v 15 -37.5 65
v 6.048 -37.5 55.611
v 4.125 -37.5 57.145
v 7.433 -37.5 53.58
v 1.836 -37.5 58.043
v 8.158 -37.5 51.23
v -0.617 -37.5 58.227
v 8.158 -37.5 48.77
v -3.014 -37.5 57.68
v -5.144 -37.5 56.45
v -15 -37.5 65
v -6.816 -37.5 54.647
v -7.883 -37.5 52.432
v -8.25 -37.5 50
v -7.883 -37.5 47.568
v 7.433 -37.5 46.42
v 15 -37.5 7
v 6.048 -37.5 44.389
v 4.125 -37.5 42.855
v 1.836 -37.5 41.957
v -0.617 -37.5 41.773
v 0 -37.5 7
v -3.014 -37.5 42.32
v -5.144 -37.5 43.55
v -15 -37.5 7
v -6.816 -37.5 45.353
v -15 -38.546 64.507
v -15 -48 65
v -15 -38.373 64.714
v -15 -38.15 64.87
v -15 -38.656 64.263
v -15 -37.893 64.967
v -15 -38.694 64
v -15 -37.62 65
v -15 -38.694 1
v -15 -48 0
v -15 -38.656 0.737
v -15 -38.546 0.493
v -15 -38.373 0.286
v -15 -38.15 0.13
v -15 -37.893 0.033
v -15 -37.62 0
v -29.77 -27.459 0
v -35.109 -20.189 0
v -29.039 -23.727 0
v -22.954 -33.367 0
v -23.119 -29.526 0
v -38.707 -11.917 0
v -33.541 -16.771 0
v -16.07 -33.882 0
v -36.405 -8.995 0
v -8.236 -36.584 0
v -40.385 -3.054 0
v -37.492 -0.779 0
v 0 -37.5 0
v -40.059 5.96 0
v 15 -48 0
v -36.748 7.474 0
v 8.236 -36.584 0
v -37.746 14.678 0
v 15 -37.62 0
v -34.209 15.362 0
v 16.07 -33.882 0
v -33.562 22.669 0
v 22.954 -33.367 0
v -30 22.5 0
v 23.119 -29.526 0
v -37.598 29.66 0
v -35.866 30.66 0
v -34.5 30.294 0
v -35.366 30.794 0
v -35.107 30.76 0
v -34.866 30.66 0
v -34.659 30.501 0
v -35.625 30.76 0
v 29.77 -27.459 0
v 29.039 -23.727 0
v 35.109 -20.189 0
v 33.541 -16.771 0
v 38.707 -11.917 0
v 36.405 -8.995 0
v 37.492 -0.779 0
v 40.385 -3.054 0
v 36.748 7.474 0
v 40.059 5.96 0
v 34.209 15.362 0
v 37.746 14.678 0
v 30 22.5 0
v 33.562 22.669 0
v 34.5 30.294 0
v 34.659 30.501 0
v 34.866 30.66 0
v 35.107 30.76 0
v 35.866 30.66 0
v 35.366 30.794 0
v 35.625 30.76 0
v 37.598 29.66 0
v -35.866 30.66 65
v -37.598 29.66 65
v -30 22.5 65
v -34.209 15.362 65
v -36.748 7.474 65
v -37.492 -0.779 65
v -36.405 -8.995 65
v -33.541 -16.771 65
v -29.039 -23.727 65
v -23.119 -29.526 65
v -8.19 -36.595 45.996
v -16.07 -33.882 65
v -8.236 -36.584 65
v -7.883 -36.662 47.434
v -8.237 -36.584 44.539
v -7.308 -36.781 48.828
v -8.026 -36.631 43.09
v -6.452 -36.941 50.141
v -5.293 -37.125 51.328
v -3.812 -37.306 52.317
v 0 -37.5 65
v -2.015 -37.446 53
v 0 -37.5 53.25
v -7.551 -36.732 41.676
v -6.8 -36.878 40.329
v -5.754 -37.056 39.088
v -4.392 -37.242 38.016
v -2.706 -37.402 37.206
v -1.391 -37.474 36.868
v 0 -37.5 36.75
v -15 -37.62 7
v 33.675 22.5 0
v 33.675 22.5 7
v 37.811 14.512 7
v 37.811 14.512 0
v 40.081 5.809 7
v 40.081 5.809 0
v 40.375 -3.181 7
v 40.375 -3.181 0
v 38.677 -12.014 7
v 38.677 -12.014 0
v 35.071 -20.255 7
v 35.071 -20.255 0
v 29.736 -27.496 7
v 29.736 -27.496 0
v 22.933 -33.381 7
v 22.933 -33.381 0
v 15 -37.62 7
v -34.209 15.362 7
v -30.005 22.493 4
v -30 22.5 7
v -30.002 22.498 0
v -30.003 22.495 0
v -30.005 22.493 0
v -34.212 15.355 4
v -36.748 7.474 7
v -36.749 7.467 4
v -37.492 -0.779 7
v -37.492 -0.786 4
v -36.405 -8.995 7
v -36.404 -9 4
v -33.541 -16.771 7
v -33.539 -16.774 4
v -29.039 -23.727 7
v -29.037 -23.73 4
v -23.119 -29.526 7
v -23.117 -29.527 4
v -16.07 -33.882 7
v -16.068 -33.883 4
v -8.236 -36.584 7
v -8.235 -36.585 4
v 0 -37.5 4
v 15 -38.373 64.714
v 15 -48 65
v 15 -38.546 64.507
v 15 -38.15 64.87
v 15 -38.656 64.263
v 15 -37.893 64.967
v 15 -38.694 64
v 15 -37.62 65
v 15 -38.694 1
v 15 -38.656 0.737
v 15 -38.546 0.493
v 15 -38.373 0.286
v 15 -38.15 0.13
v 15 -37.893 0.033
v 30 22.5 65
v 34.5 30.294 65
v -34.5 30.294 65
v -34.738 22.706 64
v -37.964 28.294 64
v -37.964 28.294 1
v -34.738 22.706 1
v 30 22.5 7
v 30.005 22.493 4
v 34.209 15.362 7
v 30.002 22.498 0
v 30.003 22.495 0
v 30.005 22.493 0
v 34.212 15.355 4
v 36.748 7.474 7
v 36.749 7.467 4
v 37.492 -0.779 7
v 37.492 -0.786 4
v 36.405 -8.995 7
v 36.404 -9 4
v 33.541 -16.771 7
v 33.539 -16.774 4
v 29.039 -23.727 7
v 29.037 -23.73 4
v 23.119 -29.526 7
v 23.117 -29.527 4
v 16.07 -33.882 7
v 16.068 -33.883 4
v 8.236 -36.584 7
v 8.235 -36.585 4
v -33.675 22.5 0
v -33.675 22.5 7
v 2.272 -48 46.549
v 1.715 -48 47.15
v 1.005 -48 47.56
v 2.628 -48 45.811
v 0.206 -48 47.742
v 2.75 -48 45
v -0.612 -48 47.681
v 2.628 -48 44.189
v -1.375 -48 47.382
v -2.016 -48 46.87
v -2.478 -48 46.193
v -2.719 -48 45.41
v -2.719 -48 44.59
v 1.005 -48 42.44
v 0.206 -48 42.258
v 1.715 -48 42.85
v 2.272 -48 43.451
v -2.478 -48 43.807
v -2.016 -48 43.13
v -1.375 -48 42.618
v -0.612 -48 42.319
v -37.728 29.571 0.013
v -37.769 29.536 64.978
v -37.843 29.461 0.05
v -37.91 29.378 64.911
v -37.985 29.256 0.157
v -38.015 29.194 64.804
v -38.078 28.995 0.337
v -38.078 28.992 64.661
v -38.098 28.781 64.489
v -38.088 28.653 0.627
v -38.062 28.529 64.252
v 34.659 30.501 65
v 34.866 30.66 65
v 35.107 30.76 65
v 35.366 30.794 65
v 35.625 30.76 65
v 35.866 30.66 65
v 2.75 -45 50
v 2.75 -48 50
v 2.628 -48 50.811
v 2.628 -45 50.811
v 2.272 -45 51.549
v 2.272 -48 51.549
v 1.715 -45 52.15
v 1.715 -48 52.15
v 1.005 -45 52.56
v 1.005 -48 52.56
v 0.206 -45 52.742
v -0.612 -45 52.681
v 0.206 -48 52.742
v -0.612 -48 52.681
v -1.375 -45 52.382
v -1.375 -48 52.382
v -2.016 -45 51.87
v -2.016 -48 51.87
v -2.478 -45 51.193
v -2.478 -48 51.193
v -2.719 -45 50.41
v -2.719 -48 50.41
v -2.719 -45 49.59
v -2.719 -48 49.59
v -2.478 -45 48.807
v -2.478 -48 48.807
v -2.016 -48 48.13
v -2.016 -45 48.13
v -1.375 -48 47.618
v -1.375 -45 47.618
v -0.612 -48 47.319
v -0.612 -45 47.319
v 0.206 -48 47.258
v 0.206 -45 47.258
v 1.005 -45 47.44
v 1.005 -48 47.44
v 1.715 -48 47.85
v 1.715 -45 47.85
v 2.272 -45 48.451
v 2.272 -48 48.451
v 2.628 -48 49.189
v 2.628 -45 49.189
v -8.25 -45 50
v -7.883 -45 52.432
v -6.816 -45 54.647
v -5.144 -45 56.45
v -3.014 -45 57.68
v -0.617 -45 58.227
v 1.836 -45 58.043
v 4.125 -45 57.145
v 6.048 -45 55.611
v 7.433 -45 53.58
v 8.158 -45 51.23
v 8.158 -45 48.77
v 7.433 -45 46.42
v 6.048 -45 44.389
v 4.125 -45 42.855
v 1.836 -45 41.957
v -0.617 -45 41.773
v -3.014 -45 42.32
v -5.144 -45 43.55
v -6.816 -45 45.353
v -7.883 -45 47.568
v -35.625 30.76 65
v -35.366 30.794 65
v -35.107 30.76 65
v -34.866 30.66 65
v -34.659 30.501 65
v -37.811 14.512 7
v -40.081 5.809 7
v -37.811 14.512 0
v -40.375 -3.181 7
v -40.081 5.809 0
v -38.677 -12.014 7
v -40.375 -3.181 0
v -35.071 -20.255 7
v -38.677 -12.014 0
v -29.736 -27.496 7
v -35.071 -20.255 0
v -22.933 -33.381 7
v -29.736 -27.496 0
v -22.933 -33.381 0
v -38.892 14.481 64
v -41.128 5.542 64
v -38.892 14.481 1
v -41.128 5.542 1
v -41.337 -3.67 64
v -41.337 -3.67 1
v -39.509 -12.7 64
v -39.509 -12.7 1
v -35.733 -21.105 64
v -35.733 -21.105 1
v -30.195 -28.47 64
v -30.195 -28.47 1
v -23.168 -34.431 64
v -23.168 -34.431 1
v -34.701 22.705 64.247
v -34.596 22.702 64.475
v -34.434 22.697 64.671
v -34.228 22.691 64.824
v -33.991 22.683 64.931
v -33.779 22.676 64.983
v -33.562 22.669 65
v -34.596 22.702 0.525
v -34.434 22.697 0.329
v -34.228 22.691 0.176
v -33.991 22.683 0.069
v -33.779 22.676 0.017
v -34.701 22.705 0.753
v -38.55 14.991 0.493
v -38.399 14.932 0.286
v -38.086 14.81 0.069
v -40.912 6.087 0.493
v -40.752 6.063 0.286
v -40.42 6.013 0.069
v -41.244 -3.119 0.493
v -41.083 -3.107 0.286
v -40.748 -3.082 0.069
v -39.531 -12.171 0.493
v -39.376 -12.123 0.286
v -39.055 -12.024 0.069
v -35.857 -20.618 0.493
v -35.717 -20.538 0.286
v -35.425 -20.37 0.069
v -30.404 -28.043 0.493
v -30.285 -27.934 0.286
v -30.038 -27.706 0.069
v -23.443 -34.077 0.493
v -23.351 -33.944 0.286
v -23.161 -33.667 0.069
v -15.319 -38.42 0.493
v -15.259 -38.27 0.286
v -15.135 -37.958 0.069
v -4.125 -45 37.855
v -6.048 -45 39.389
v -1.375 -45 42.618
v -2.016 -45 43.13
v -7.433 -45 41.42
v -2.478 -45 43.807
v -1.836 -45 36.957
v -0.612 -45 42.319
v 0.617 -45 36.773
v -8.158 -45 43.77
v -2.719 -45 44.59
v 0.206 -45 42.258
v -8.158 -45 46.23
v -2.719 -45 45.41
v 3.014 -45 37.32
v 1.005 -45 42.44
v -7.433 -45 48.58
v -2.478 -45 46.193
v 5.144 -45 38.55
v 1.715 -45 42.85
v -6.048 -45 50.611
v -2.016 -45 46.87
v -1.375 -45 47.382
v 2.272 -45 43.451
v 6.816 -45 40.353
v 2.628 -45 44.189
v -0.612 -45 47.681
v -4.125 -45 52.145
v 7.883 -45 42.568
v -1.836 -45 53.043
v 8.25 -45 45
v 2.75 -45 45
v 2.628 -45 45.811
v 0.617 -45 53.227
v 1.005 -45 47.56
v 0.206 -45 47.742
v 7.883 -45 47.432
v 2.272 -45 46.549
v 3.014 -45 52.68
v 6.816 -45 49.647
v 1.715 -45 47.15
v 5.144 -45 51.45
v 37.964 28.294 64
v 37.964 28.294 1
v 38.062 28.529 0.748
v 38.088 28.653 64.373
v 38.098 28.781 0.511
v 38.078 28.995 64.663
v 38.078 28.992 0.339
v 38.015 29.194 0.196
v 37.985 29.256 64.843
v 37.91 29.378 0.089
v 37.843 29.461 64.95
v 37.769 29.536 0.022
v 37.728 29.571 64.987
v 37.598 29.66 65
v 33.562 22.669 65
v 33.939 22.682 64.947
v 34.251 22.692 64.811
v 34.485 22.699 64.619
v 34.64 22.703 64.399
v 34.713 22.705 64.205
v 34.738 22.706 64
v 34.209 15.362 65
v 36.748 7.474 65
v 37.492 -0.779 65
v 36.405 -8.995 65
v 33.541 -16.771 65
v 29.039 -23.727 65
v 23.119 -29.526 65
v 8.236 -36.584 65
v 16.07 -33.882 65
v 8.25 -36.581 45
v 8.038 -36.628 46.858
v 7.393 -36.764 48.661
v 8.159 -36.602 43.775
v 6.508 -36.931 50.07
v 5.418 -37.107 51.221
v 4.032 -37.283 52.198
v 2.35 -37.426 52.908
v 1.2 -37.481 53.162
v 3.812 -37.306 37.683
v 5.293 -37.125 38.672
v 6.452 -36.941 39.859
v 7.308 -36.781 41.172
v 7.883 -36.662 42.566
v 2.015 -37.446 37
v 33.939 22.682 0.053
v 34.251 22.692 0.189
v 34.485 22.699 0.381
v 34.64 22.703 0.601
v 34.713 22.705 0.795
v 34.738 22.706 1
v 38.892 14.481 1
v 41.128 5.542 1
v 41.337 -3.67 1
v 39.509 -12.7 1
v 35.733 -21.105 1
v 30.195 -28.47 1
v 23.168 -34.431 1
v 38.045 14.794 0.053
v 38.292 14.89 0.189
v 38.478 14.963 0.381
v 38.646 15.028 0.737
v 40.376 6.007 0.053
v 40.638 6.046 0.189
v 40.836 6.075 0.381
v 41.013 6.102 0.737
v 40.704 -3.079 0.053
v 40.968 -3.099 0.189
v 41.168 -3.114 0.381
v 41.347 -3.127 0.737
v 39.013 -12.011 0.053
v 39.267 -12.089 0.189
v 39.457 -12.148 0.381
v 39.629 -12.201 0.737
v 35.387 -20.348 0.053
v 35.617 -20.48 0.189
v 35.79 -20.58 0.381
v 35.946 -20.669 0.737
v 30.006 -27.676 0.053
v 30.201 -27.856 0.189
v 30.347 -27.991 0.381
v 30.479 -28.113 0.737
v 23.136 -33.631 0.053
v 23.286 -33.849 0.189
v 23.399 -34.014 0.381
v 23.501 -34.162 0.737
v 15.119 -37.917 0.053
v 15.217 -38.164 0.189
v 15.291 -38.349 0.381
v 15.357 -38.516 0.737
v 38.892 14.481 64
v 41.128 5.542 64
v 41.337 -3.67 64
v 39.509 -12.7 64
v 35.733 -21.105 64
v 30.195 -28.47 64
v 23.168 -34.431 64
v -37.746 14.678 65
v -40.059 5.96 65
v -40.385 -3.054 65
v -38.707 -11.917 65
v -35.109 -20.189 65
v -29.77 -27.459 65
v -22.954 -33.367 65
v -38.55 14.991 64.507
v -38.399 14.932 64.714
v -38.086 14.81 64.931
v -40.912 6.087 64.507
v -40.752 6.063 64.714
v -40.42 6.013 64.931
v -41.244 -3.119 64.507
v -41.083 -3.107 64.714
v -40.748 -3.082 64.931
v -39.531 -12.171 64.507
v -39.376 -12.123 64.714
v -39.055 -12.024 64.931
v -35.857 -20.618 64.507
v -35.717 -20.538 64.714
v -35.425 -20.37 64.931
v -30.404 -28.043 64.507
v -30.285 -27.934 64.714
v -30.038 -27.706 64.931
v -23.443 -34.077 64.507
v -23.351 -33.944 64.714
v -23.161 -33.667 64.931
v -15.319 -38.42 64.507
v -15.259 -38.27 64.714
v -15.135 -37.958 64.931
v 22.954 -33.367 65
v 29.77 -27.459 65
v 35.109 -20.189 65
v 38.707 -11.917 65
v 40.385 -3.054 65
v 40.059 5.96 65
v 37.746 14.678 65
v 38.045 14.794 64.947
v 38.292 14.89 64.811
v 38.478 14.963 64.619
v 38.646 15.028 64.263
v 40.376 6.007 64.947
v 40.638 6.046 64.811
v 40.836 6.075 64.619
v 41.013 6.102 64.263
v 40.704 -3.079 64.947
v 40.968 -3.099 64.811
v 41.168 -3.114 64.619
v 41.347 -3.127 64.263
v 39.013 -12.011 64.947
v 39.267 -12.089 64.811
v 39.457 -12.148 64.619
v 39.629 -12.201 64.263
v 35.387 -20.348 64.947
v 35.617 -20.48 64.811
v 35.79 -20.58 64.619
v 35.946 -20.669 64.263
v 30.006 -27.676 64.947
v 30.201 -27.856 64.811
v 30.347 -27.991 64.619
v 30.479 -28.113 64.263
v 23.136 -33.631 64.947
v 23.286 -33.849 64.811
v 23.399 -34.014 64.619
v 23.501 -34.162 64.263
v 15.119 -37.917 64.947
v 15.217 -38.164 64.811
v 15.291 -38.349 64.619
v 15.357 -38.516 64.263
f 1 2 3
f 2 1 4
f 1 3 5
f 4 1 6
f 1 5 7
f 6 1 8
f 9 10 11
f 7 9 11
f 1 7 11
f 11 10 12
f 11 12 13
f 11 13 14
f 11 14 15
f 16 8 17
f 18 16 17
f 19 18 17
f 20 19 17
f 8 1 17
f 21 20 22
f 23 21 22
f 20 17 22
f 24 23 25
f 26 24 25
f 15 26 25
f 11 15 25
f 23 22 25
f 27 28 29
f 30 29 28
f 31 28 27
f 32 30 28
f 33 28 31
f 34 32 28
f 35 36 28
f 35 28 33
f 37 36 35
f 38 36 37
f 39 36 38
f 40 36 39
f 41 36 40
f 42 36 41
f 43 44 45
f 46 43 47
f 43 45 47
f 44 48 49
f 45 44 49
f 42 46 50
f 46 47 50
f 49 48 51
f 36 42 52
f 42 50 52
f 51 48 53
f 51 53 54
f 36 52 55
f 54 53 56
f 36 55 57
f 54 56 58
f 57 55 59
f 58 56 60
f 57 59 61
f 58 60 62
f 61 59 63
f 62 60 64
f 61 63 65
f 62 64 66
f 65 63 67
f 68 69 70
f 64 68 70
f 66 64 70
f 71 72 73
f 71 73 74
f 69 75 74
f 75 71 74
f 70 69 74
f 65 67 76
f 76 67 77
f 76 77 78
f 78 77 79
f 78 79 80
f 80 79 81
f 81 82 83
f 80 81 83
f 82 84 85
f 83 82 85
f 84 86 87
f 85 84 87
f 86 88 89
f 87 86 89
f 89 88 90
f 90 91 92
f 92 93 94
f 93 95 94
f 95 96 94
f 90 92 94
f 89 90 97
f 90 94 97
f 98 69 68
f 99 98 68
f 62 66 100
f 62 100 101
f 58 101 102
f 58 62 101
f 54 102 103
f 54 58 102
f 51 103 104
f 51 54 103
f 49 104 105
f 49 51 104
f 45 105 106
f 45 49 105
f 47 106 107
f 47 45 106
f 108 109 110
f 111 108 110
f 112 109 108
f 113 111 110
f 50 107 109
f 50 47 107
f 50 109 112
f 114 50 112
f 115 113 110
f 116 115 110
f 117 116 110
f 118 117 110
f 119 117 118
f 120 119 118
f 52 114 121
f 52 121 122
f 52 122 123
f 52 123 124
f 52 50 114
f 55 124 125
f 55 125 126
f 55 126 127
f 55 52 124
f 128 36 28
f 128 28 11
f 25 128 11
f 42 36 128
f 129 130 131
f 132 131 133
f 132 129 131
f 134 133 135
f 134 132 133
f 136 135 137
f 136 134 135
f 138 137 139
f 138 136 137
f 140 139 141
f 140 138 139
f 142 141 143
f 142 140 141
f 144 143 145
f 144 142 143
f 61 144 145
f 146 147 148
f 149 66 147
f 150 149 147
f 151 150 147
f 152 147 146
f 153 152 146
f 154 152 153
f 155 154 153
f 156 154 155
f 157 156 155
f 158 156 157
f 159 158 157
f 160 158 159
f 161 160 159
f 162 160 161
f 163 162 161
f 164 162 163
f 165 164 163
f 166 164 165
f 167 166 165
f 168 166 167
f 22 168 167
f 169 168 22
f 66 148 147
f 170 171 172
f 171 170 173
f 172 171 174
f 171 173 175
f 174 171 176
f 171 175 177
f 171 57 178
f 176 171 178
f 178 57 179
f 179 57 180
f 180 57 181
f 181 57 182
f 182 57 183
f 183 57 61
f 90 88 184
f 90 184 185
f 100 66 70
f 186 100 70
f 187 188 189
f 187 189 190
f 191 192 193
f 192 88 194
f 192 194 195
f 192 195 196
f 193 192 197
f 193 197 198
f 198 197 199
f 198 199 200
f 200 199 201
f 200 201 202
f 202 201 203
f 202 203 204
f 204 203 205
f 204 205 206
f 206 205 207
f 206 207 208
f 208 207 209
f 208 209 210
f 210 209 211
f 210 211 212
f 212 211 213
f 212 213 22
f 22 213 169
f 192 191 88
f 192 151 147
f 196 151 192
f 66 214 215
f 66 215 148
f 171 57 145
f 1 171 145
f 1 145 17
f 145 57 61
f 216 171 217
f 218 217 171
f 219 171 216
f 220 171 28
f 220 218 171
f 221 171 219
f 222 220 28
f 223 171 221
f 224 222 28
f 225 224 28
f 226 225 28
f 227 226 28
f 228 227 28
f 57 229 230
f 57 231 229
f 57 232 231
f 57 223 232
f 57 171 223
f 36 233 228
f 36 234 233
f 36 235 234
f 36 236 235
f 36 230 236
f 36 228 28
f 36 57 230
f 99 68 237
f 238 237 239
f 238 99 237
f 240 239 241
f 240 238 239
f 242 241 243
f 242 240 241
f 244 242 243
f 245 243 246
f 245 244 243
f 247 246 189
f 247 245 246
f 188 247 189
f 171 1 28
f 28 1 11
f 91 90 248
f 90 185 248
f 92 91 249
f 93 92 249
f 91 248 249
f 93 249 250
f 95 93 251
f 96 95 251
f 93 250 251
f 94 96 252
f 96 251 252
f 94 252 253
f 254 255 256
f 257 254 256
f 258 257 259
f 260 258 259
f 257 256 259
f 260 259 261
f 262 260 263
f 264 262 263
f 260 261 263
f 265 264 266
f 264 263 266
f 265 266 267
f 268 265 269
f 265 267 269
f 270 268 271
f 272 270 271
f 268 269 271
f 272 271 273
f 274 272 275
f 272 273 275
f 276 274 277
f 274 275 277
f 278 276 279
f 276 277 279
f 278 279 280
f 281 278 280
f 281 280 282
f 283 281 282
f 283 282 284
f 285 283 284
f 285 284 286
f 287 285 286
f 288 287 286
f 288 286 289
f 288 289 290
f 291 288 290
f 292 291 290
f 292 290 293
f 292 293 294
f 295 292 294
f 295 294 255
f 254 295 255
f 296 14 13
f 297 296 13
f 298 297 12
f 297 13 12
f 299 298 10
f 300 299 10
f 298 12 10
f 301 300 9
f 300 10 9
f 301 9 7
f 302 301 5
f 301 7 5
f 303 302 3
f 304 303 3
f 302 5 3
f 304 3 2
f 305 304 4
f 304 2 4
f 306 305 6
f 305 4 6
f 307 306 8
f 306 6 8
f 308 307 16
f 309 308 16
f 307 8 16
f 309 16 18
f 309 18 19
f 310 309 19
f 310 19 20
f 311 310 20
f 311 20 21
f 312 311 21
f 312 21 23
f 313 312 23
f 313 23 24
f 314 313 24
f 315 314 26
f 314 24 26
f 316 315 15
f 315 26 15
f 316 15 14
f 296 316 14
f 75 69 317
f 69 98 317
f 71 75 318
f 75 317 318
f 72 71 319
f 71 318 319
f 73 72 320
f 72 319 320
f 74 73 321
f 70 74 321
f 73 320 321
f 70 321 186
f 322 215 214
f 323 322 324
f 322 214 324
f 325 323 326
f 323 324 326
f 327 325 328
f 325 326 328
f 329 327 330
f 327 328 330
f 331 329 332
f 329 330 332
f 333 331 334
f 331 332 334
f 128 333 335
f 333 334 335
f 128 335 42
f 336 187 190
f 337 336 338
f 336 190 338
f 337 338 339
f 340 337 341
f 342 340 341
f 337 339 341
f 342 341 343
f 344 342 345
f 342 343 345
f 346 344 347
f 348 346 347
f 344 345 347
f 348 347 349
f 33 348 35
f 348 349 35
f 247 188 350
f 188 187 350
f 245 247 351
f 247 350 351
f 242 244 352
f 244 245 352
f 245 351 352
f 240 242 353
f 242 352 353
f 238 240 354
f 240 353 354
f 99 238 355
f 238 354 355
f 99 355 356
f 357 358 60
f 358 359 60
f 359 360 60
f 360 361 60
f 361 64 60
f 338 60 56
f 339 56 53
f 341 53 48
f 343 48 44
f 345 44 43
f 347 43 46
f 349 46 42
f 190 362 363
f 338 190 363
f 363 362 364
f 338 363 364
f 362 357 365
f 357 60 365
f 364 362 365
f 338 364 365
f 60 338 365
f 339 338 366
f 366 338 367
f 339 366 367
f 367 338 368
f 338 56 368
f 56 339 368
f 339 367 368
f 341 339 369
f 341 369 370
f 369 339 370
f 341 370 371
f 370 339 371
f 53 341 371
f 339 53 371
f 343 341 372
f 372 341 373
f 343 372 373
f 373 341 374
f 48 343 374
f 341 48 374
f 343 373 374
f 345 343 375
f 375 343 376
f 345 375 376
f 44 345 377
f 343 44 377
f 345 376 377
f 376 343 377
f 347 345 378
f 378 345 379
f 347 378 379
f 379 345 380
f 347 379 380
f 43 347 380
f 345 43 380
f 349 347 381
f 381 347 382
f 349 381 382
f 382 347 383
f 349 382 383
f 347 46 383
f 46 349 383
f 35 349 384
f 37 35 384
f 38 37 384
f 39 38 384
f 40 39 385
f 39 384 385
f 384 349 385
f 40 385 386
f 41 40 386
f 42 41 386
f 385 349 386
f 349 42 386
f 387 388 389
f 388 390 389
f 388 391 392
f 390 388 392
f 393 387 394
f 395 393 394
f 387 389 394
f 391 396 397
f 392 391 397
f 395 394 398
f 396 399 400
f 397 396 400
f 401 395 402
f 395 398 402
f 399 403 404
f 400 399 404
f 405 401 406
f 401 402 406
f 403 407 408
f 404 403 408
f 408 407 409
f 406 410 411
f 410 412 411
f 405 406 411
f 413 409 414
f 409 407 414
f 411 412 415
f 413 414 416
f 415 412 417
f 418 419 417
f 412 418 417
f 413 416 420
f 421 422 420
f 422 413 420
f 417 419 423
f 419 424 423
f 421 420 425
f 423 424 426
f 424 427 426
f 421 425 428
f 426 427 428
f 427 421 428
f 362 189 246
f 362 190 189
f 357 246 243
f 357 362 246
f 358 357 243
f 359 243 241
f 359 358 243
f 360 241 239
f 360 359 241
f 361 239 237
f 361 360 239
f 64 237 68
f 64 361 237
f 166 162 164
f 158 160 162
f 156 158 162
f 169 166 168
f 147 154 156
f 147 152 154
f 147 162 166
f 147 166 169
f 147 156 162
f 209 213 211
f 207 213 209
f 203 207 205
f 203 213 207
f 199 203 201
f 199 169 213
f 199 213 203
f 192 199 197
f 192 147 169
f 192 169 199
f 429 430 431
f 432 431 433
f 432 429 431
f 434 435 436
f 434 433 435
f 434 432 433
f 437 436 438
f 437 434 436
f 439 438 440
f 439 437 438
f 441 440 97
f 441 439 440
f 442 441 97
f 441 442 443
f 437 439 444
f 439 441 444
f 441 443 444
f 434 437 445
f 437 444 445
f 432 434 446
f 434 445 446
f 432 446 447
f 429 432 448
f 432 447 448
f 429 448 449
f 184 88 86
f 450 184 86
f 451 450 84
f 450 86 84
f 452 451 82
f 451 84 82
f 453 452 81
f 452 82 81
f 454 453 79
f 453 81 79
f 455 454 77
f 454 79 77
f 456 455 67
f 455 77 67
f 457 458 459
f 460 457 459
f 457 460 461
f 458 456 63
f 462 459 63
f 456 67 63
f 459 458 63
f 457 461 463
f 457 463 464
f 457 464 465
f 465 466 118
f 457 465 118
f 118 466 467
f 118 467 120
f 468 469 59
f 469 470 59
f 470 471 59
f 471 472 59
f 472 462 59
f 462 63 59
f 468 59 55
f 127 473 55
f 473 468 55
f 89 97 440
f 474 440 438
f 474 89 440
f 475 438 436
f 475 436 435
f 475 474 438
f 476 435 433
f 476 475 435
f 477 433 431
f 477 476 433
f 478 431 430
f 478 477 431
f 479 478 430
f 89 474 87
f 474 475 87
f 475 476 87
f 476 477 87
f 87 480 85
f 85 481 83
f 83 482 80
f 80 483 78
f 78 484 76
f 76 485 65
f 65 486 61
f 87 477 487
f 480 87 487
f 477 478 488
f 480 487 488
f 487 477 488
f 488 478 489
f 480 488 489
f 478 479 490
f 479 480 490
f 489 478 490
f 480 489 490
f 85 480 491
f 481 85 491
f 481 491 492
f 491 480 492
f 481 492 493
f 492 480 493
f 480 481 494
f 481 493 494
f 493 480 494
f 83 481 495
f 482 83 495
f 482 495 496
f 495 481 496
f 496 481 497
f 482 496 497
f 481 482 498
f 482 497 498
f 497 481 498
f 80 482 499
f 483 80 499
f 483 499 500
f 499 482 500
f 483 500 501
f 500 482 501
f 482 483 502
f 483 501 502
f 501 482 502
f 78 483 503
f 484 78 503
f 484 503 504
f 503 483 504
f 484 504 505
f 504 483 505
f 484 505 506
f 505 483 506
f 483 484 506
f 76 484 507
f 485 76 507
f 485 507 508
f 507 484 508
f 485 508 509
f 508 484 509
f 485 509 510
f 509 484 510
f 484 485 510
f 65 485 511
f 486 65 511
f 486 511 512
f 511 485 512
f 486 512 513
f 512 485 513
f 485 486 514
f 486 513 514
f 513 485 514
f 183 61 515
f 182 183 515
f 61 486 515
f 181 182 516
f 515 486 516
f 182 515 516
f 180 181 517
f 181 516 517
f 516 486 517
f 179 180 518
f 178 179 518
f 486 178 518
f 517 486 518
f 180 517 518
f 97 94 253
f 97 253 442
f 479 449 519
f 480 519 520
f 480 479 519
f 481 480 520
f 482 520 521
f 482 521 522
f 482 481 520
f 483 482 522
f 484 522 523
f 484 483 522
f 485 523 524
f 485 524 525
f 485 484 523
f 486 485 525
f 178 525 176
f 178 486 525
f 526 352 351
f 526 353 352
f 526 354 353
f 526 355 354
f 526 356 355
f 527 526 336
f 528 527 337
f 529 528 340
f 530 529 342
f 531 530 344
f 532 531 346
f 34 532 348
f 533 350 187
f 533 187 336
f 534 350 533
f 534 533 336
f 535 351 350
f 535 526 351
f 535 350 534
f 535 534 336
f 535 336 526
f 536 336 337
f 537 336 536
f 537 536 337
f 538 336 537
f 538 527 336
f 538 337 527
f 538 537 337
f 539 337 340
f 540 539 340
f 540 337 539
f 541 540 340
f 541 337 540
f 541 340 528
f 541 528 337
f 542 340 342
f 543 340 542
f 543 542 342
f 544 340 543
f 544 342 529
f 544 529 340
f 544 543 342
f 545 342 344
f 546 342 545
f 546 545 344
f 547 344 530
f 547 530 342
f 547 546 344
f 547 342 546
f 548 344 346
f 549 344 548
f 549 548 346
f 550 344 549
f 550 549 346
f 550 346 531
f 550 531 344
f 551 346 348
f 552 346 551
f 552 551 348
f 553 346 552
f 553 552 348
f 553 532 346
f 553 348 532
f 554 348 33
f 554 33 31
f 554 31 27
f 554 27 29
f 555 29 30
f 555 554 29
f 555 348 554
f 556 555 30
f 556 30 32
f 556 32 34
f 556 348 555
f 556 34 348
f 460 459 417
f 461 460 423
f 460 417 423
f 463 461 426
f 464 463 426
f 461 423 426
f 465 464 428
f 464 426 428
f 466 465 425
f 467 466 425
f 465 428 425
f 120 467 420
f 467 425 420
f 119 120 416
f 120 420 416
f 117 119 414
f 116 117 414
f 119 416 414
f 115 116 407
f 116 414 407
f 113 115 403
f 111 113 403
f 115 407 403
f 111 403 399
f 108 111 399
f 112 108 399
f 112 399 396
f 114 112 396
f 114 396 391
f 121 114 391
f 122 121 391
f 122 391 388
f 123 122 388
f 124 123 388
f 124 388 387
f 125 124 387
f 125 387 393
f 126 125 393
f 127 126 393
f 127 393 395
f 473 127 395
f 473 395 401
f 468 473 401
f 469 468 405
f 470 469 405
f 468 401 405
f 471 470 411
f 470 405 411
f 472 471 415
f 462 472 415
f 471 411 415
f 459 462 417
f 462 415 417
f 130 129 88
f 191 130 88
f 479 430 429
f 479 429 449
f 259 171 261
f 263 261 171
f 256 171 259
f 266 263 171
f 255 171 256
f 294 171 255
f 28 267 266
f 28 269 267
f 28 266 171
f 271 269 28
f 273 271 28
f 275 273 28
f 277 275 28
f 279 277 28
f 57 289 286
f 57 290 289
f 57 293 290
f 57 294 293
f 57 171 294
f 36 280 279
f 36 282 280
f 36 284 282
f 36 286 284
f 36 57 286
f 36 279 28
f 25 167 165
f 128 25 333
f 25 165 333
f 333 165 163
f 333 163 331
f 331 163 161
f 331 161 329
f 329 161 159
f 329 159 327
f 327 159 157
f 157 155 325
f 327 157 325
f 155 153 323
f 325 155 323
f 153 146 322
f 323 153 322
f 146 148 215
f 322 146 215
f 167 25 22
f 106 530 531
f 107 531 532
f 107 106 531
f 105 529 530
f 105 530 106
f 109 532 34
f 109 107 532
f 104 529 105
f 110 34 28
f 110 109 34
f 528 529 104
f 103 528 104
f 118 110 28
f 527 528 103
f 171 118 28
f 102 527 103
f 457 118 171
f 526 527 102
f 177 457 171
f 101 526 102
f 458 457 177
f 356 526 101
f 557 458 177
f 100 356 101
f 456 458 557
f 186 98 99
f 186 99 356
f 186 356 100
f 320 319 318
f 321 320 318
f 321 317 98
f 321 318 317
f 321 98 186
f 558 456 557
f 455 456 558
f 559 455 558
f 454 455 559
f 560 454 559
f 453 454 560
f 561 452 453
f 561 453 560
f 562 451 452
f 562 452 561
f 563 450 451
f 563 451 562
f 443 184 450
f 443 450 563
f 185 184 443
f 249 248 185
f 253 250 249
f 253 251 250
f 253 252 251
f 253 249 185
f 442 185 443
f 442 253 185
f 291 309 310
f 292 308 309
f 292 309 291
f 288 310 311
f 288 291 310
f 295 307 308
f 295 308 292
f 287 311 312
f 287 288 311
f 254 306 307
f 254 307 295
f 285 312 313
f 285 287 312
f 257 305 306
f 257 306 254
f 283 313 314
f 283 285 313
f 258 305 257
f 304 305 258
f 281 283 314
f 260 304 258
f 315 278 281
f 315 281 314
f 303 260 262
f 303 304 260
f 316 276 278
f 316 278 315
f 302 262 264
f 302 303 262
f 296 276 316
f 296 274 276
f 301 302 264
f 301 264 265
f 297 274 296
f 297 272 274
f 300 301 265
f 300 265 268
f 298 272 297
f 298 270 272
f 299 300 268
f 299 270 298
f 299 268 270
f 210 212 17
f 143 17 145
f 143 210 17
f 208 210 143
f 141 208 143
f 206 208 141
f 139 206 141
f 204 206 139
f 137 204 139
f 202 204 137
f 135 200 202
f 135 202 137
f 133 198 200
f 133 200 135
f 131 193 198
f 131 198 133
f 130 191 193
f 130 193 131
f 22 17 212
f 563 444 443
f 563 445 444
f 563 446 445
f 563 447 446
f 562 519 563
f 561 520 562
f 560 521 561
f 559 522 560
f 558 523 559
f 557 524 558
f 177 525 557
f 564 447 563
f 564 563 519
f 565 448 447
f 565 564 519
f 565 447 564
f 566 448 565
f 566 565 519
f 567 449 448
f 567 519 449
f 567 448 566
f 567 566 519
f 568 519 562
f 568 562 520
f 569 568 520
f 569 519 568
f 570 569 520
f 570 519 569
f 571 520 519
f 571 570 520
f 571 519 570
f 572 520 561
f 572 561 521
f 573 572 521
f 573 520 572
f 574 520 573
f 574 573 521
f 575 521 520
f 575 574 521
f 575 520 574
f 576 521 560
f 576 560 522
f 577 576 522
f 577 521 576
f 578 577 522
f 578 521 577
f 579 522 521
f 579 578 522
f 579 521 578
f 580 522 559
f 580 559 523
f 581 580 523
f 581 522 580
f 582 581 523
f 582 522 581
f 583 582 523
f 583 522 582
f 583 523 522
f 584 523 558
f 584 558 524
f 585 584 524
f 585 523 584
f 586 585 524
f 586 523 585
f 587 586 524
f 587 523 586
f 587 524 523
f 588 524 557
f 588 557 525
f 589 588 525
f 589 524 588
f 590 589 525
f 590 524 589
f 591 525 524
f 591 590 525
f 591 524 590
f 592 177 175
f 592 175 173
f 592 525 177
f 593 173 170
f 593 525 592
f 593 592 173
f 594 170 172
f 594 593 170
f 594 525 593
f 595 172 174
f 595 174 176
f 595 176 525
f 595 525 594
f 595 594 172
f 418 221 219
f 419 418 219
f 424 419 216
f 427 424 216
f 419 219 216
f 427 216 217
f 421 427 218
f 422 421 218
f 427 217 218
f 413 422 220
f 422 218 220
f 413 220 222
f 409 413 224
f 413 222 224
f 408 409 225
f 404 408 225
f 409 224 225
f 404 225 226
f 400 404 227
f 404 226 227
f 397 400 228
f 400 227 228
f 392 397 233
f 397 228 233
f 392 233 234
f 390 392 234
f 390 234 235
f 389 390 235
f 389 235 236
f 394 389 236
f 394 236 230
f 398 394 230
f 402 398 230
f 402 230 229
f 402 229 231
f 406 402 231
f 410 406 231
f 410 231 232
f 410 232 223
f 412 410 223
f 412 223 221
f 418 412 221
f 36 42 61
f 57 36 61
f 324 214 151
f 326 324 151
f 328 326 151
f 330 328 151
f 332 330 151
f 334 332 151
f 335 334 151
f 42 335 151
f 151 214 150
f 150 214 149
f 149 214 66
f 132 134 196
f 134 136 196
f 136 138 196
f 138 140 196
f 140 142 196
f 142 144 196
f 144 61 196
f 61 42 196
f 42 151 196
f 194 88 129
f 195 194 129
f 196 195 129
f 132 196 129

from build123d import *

# Parameters (mm, degrees)
PAD_DEPTH       = 65
SKETCH001_W     = 15
SKETCH001_H     = 10.5
PAD001_DEPTH    = 65
SKETCH010_R     = 8.25
POCKET_DEPTH    = 79.161254
SKETCH011_R     = 11.43427
PAD005_DEPTH    = 3
SKETCH012_R     = 2.75
POCKET004_DEPTH = 79.161254
FILLET_R        = 1
FILLET001_R     = 1
FILLET002_R     = 1
PAD002_DEPTH    = 7
SKETCH004_W     = 15
SKETCH004_H     = 10.5
PAD003_DEPTH    = 65
SKETCH005_R     = 2.5
POCKET001_DEPTH = 55.501
PAD004_DEPTH    = 4
SKETCH008_R     = 2.75
POCKET002_DEPTH = 70.501
SKETCH009_R     = 8.25
POCKET003_DEPTH = 7.5


with BuildPart() as upper:
    # Sketch → Pad (new body)
    with BuildSketch(Plane.XY):
        with BuildLine():
            ThreePointArc((-30, 22.5), (-33.54102, -16.77051), (0, -37.5))
            Line((0, -37.5), (0, -41.5))
            ThreePointArc((-34.737583, 22.705734), (-36.50026, -19.747937), (0, -41.5))
            Line((-38.464102, 29.160254), (-34.737583, 22.705734))
            Line((-35, 31.160254), (-38.464102, 29.160254))
            Line((-30, 22.5), (-35, 31.160254))
        make_face()
    pad = extrude(amount=PAD_DEPTH)

    # Sketch001 → Pad001 (join)
    with BuildSketch(Plane.XY):
        with Locations((-7.5, -42.75)):
            Rectangle(SKETCH001_W, SKETCH001_H)
    pad001 = extrude(amount=PAD001_DEPTH)

    # Mirrored: Pad001, Pad across Sketch001 V_Axis
    add(pad001.mirror(Plane(origin=(0, 0, 0), x_dir=(0, 0, 1), z_dir=(1, 0, 0))))
    add(pad.mirror(Plane(origin=(0, 0, 0), x_dir=(0, 0, 1), z_dir=(1, 0, 0))))

    # Sketch010 (on Face15 of Pad001) → Pocket (cut, through all)
    with BuildSketch(Plane.XZ.offset(48)):
        with Locations((0, 45)):
            Circle(SKETCH010_R)
    extrude(amount=-POCKET_DEPTH, mode=Mode.SUBTRACT)

    # Sketch011 (on Face16 of Pocket) → Pad005 (join)
    with BuildSketch(Plane.XZ.offset(48)):
        with Locations((0, 45)):
            Circle(SKETCH011_R)
    extrude(amount=-PAD005_DEPTH)

    # Sketch012 (on Face28 of Pad005) → Pocket004 (cut, through all)
    with BuildSketch(Plane.XZ.offset(48)):
        with Locations((0, 45)):
            Circle(SKETCH012_R)
    extrude(amount=-POCKET004_DEPTH, mode=Mode.SUBTRACT)

    # Fillet
    fillet_edges = [upper.edges().sort_by_distance(p)[0] for p in [
        (39.508838, -12.700462, 0),
        (36.600842, 25.932994, 0),
        (38.464102, 29.160254, 32.5),
        (36.600842, 25.932994, 65),
        (39.508838, -12.700462, 65),
    ]]
    fillet(fillet_edges, radius=FILLET_R)

    # Fillet001
    fillet001_edges = [upper.edges().sort_by_distance(p)[0] for p in [
        (-39.508838, -12.700462, 0),
        (-36.600842, 25.932994, 0),
        (-38.464102, 29.160254, 32.5),
        (-36.600842, 25.932994, 65),
        (-39.508838, -12.700462, 65),
    ]]
    fillet(fillet001_edges, radius=FILLET001_R)

    # Fillet002
    fillet002_edges = [upper.edges().sort_by_distance(p)[0] for p in [
        (-35, 31.160254, 32.5),
        (35, 31.160254, 32.5),
    ]]
    fillet(fillet002_edges, radius=FILLET002_R)


with BuildPart() as lower:
    # Sketch003 → Pad002 (new body)
    with BuildSketch(Plane.XY):
        with BuildLine():
            ThreePointArc((-30, 22.5), (-33.54102, -16.77051), (0, -37.5))
            Line((0, -37.5), (0, -40.5))
            ThreePointArc((-33.674916, 22.5), (-35.717643, -19.091883), (0, -40.5))
            Line((-33.674916, 22.5), (-30, 22.5))
        make_face()
    pad002 = extrude(amount=PAD002_DEPTH)

    # Sketch004 → Pad003 (join)
    with BuildSketch(Plane.XY):
        with Locations((-7.5, -42.75)):
            Rectangle(SKETCH004_W, SKETCH004_H)
    pad003 = extrude(amount=PAD003_DEPTH)

    # Mirrored001: Pad003, Pad002 across Sketch004 V_Axis
    add(pad003.mirror(Plane(origin=(0, 0, 0), x_dir=(0, 0, 1), z_dir=(1, 0, 0))))
    add(pad002.mirror(Plane(origin=(0, 0, 0), x_dir=(0, 0, 1), z_dir=(1, 0, 0))))

    # Sketch005 (on Face22 of Mirrored001) → Pocket001 (cut, through all)
    with BuildSketch(Plane.YZ.offset(15)):
        with Locations((0, 20)):
            Circle(SKETCH005_R)
    extrude(amount=-POCKET001_DEPTH, mode=Mode.SUBTRACT)

    # Sketch007 → Pad004 (join)
    with BuildSketch(Plane.XY):
        with BuildLine():
            ThreePointArc((-31.86, 22.493119), (-34.628252, -17.941131), (0, -39))
            Line((0, -39), (0, 22.493119))
            Line((-31.86, 22.493119), (0, 22.493119))
        make_face()
    pad004 = extrude(amount=PAD004_DEPTH)

    # Mirrored002: Pad004 across Sketch007 V_Axis
    add(pad004.mirror(Plane(origin=(0, 0, 0), x_dir=(0, 0, 1), z_dir=(1, 0, 0))))

    # Sketch008 (on Face14 of Mirrored002) → Pocket002 (cut, through all)
    with BuildSketch(Plane.XZ.offset(48)):
        with Locations((0, 50)):
            Circle(SKETCH008_R)
    extrude(amount=-POCKET002_DEPTH, mode=Mode.SUBTRACT)

    # Sketch009 (on Face12 of Pocket002) → Pocket003 (cut)
    with BuildSketch(Plane(origin=(0, -37.5, 0), x_dir=(-1, 0, 0), z_dir=(0, 1, 0))):
        with Locations((0, 50)):
            Circle(SKETCH009_R)
    extrude(amount=-POCKET003_DEPTH, mode=Mode.SUBTRACT)


solid = Compound([upper.part, lower.part])
